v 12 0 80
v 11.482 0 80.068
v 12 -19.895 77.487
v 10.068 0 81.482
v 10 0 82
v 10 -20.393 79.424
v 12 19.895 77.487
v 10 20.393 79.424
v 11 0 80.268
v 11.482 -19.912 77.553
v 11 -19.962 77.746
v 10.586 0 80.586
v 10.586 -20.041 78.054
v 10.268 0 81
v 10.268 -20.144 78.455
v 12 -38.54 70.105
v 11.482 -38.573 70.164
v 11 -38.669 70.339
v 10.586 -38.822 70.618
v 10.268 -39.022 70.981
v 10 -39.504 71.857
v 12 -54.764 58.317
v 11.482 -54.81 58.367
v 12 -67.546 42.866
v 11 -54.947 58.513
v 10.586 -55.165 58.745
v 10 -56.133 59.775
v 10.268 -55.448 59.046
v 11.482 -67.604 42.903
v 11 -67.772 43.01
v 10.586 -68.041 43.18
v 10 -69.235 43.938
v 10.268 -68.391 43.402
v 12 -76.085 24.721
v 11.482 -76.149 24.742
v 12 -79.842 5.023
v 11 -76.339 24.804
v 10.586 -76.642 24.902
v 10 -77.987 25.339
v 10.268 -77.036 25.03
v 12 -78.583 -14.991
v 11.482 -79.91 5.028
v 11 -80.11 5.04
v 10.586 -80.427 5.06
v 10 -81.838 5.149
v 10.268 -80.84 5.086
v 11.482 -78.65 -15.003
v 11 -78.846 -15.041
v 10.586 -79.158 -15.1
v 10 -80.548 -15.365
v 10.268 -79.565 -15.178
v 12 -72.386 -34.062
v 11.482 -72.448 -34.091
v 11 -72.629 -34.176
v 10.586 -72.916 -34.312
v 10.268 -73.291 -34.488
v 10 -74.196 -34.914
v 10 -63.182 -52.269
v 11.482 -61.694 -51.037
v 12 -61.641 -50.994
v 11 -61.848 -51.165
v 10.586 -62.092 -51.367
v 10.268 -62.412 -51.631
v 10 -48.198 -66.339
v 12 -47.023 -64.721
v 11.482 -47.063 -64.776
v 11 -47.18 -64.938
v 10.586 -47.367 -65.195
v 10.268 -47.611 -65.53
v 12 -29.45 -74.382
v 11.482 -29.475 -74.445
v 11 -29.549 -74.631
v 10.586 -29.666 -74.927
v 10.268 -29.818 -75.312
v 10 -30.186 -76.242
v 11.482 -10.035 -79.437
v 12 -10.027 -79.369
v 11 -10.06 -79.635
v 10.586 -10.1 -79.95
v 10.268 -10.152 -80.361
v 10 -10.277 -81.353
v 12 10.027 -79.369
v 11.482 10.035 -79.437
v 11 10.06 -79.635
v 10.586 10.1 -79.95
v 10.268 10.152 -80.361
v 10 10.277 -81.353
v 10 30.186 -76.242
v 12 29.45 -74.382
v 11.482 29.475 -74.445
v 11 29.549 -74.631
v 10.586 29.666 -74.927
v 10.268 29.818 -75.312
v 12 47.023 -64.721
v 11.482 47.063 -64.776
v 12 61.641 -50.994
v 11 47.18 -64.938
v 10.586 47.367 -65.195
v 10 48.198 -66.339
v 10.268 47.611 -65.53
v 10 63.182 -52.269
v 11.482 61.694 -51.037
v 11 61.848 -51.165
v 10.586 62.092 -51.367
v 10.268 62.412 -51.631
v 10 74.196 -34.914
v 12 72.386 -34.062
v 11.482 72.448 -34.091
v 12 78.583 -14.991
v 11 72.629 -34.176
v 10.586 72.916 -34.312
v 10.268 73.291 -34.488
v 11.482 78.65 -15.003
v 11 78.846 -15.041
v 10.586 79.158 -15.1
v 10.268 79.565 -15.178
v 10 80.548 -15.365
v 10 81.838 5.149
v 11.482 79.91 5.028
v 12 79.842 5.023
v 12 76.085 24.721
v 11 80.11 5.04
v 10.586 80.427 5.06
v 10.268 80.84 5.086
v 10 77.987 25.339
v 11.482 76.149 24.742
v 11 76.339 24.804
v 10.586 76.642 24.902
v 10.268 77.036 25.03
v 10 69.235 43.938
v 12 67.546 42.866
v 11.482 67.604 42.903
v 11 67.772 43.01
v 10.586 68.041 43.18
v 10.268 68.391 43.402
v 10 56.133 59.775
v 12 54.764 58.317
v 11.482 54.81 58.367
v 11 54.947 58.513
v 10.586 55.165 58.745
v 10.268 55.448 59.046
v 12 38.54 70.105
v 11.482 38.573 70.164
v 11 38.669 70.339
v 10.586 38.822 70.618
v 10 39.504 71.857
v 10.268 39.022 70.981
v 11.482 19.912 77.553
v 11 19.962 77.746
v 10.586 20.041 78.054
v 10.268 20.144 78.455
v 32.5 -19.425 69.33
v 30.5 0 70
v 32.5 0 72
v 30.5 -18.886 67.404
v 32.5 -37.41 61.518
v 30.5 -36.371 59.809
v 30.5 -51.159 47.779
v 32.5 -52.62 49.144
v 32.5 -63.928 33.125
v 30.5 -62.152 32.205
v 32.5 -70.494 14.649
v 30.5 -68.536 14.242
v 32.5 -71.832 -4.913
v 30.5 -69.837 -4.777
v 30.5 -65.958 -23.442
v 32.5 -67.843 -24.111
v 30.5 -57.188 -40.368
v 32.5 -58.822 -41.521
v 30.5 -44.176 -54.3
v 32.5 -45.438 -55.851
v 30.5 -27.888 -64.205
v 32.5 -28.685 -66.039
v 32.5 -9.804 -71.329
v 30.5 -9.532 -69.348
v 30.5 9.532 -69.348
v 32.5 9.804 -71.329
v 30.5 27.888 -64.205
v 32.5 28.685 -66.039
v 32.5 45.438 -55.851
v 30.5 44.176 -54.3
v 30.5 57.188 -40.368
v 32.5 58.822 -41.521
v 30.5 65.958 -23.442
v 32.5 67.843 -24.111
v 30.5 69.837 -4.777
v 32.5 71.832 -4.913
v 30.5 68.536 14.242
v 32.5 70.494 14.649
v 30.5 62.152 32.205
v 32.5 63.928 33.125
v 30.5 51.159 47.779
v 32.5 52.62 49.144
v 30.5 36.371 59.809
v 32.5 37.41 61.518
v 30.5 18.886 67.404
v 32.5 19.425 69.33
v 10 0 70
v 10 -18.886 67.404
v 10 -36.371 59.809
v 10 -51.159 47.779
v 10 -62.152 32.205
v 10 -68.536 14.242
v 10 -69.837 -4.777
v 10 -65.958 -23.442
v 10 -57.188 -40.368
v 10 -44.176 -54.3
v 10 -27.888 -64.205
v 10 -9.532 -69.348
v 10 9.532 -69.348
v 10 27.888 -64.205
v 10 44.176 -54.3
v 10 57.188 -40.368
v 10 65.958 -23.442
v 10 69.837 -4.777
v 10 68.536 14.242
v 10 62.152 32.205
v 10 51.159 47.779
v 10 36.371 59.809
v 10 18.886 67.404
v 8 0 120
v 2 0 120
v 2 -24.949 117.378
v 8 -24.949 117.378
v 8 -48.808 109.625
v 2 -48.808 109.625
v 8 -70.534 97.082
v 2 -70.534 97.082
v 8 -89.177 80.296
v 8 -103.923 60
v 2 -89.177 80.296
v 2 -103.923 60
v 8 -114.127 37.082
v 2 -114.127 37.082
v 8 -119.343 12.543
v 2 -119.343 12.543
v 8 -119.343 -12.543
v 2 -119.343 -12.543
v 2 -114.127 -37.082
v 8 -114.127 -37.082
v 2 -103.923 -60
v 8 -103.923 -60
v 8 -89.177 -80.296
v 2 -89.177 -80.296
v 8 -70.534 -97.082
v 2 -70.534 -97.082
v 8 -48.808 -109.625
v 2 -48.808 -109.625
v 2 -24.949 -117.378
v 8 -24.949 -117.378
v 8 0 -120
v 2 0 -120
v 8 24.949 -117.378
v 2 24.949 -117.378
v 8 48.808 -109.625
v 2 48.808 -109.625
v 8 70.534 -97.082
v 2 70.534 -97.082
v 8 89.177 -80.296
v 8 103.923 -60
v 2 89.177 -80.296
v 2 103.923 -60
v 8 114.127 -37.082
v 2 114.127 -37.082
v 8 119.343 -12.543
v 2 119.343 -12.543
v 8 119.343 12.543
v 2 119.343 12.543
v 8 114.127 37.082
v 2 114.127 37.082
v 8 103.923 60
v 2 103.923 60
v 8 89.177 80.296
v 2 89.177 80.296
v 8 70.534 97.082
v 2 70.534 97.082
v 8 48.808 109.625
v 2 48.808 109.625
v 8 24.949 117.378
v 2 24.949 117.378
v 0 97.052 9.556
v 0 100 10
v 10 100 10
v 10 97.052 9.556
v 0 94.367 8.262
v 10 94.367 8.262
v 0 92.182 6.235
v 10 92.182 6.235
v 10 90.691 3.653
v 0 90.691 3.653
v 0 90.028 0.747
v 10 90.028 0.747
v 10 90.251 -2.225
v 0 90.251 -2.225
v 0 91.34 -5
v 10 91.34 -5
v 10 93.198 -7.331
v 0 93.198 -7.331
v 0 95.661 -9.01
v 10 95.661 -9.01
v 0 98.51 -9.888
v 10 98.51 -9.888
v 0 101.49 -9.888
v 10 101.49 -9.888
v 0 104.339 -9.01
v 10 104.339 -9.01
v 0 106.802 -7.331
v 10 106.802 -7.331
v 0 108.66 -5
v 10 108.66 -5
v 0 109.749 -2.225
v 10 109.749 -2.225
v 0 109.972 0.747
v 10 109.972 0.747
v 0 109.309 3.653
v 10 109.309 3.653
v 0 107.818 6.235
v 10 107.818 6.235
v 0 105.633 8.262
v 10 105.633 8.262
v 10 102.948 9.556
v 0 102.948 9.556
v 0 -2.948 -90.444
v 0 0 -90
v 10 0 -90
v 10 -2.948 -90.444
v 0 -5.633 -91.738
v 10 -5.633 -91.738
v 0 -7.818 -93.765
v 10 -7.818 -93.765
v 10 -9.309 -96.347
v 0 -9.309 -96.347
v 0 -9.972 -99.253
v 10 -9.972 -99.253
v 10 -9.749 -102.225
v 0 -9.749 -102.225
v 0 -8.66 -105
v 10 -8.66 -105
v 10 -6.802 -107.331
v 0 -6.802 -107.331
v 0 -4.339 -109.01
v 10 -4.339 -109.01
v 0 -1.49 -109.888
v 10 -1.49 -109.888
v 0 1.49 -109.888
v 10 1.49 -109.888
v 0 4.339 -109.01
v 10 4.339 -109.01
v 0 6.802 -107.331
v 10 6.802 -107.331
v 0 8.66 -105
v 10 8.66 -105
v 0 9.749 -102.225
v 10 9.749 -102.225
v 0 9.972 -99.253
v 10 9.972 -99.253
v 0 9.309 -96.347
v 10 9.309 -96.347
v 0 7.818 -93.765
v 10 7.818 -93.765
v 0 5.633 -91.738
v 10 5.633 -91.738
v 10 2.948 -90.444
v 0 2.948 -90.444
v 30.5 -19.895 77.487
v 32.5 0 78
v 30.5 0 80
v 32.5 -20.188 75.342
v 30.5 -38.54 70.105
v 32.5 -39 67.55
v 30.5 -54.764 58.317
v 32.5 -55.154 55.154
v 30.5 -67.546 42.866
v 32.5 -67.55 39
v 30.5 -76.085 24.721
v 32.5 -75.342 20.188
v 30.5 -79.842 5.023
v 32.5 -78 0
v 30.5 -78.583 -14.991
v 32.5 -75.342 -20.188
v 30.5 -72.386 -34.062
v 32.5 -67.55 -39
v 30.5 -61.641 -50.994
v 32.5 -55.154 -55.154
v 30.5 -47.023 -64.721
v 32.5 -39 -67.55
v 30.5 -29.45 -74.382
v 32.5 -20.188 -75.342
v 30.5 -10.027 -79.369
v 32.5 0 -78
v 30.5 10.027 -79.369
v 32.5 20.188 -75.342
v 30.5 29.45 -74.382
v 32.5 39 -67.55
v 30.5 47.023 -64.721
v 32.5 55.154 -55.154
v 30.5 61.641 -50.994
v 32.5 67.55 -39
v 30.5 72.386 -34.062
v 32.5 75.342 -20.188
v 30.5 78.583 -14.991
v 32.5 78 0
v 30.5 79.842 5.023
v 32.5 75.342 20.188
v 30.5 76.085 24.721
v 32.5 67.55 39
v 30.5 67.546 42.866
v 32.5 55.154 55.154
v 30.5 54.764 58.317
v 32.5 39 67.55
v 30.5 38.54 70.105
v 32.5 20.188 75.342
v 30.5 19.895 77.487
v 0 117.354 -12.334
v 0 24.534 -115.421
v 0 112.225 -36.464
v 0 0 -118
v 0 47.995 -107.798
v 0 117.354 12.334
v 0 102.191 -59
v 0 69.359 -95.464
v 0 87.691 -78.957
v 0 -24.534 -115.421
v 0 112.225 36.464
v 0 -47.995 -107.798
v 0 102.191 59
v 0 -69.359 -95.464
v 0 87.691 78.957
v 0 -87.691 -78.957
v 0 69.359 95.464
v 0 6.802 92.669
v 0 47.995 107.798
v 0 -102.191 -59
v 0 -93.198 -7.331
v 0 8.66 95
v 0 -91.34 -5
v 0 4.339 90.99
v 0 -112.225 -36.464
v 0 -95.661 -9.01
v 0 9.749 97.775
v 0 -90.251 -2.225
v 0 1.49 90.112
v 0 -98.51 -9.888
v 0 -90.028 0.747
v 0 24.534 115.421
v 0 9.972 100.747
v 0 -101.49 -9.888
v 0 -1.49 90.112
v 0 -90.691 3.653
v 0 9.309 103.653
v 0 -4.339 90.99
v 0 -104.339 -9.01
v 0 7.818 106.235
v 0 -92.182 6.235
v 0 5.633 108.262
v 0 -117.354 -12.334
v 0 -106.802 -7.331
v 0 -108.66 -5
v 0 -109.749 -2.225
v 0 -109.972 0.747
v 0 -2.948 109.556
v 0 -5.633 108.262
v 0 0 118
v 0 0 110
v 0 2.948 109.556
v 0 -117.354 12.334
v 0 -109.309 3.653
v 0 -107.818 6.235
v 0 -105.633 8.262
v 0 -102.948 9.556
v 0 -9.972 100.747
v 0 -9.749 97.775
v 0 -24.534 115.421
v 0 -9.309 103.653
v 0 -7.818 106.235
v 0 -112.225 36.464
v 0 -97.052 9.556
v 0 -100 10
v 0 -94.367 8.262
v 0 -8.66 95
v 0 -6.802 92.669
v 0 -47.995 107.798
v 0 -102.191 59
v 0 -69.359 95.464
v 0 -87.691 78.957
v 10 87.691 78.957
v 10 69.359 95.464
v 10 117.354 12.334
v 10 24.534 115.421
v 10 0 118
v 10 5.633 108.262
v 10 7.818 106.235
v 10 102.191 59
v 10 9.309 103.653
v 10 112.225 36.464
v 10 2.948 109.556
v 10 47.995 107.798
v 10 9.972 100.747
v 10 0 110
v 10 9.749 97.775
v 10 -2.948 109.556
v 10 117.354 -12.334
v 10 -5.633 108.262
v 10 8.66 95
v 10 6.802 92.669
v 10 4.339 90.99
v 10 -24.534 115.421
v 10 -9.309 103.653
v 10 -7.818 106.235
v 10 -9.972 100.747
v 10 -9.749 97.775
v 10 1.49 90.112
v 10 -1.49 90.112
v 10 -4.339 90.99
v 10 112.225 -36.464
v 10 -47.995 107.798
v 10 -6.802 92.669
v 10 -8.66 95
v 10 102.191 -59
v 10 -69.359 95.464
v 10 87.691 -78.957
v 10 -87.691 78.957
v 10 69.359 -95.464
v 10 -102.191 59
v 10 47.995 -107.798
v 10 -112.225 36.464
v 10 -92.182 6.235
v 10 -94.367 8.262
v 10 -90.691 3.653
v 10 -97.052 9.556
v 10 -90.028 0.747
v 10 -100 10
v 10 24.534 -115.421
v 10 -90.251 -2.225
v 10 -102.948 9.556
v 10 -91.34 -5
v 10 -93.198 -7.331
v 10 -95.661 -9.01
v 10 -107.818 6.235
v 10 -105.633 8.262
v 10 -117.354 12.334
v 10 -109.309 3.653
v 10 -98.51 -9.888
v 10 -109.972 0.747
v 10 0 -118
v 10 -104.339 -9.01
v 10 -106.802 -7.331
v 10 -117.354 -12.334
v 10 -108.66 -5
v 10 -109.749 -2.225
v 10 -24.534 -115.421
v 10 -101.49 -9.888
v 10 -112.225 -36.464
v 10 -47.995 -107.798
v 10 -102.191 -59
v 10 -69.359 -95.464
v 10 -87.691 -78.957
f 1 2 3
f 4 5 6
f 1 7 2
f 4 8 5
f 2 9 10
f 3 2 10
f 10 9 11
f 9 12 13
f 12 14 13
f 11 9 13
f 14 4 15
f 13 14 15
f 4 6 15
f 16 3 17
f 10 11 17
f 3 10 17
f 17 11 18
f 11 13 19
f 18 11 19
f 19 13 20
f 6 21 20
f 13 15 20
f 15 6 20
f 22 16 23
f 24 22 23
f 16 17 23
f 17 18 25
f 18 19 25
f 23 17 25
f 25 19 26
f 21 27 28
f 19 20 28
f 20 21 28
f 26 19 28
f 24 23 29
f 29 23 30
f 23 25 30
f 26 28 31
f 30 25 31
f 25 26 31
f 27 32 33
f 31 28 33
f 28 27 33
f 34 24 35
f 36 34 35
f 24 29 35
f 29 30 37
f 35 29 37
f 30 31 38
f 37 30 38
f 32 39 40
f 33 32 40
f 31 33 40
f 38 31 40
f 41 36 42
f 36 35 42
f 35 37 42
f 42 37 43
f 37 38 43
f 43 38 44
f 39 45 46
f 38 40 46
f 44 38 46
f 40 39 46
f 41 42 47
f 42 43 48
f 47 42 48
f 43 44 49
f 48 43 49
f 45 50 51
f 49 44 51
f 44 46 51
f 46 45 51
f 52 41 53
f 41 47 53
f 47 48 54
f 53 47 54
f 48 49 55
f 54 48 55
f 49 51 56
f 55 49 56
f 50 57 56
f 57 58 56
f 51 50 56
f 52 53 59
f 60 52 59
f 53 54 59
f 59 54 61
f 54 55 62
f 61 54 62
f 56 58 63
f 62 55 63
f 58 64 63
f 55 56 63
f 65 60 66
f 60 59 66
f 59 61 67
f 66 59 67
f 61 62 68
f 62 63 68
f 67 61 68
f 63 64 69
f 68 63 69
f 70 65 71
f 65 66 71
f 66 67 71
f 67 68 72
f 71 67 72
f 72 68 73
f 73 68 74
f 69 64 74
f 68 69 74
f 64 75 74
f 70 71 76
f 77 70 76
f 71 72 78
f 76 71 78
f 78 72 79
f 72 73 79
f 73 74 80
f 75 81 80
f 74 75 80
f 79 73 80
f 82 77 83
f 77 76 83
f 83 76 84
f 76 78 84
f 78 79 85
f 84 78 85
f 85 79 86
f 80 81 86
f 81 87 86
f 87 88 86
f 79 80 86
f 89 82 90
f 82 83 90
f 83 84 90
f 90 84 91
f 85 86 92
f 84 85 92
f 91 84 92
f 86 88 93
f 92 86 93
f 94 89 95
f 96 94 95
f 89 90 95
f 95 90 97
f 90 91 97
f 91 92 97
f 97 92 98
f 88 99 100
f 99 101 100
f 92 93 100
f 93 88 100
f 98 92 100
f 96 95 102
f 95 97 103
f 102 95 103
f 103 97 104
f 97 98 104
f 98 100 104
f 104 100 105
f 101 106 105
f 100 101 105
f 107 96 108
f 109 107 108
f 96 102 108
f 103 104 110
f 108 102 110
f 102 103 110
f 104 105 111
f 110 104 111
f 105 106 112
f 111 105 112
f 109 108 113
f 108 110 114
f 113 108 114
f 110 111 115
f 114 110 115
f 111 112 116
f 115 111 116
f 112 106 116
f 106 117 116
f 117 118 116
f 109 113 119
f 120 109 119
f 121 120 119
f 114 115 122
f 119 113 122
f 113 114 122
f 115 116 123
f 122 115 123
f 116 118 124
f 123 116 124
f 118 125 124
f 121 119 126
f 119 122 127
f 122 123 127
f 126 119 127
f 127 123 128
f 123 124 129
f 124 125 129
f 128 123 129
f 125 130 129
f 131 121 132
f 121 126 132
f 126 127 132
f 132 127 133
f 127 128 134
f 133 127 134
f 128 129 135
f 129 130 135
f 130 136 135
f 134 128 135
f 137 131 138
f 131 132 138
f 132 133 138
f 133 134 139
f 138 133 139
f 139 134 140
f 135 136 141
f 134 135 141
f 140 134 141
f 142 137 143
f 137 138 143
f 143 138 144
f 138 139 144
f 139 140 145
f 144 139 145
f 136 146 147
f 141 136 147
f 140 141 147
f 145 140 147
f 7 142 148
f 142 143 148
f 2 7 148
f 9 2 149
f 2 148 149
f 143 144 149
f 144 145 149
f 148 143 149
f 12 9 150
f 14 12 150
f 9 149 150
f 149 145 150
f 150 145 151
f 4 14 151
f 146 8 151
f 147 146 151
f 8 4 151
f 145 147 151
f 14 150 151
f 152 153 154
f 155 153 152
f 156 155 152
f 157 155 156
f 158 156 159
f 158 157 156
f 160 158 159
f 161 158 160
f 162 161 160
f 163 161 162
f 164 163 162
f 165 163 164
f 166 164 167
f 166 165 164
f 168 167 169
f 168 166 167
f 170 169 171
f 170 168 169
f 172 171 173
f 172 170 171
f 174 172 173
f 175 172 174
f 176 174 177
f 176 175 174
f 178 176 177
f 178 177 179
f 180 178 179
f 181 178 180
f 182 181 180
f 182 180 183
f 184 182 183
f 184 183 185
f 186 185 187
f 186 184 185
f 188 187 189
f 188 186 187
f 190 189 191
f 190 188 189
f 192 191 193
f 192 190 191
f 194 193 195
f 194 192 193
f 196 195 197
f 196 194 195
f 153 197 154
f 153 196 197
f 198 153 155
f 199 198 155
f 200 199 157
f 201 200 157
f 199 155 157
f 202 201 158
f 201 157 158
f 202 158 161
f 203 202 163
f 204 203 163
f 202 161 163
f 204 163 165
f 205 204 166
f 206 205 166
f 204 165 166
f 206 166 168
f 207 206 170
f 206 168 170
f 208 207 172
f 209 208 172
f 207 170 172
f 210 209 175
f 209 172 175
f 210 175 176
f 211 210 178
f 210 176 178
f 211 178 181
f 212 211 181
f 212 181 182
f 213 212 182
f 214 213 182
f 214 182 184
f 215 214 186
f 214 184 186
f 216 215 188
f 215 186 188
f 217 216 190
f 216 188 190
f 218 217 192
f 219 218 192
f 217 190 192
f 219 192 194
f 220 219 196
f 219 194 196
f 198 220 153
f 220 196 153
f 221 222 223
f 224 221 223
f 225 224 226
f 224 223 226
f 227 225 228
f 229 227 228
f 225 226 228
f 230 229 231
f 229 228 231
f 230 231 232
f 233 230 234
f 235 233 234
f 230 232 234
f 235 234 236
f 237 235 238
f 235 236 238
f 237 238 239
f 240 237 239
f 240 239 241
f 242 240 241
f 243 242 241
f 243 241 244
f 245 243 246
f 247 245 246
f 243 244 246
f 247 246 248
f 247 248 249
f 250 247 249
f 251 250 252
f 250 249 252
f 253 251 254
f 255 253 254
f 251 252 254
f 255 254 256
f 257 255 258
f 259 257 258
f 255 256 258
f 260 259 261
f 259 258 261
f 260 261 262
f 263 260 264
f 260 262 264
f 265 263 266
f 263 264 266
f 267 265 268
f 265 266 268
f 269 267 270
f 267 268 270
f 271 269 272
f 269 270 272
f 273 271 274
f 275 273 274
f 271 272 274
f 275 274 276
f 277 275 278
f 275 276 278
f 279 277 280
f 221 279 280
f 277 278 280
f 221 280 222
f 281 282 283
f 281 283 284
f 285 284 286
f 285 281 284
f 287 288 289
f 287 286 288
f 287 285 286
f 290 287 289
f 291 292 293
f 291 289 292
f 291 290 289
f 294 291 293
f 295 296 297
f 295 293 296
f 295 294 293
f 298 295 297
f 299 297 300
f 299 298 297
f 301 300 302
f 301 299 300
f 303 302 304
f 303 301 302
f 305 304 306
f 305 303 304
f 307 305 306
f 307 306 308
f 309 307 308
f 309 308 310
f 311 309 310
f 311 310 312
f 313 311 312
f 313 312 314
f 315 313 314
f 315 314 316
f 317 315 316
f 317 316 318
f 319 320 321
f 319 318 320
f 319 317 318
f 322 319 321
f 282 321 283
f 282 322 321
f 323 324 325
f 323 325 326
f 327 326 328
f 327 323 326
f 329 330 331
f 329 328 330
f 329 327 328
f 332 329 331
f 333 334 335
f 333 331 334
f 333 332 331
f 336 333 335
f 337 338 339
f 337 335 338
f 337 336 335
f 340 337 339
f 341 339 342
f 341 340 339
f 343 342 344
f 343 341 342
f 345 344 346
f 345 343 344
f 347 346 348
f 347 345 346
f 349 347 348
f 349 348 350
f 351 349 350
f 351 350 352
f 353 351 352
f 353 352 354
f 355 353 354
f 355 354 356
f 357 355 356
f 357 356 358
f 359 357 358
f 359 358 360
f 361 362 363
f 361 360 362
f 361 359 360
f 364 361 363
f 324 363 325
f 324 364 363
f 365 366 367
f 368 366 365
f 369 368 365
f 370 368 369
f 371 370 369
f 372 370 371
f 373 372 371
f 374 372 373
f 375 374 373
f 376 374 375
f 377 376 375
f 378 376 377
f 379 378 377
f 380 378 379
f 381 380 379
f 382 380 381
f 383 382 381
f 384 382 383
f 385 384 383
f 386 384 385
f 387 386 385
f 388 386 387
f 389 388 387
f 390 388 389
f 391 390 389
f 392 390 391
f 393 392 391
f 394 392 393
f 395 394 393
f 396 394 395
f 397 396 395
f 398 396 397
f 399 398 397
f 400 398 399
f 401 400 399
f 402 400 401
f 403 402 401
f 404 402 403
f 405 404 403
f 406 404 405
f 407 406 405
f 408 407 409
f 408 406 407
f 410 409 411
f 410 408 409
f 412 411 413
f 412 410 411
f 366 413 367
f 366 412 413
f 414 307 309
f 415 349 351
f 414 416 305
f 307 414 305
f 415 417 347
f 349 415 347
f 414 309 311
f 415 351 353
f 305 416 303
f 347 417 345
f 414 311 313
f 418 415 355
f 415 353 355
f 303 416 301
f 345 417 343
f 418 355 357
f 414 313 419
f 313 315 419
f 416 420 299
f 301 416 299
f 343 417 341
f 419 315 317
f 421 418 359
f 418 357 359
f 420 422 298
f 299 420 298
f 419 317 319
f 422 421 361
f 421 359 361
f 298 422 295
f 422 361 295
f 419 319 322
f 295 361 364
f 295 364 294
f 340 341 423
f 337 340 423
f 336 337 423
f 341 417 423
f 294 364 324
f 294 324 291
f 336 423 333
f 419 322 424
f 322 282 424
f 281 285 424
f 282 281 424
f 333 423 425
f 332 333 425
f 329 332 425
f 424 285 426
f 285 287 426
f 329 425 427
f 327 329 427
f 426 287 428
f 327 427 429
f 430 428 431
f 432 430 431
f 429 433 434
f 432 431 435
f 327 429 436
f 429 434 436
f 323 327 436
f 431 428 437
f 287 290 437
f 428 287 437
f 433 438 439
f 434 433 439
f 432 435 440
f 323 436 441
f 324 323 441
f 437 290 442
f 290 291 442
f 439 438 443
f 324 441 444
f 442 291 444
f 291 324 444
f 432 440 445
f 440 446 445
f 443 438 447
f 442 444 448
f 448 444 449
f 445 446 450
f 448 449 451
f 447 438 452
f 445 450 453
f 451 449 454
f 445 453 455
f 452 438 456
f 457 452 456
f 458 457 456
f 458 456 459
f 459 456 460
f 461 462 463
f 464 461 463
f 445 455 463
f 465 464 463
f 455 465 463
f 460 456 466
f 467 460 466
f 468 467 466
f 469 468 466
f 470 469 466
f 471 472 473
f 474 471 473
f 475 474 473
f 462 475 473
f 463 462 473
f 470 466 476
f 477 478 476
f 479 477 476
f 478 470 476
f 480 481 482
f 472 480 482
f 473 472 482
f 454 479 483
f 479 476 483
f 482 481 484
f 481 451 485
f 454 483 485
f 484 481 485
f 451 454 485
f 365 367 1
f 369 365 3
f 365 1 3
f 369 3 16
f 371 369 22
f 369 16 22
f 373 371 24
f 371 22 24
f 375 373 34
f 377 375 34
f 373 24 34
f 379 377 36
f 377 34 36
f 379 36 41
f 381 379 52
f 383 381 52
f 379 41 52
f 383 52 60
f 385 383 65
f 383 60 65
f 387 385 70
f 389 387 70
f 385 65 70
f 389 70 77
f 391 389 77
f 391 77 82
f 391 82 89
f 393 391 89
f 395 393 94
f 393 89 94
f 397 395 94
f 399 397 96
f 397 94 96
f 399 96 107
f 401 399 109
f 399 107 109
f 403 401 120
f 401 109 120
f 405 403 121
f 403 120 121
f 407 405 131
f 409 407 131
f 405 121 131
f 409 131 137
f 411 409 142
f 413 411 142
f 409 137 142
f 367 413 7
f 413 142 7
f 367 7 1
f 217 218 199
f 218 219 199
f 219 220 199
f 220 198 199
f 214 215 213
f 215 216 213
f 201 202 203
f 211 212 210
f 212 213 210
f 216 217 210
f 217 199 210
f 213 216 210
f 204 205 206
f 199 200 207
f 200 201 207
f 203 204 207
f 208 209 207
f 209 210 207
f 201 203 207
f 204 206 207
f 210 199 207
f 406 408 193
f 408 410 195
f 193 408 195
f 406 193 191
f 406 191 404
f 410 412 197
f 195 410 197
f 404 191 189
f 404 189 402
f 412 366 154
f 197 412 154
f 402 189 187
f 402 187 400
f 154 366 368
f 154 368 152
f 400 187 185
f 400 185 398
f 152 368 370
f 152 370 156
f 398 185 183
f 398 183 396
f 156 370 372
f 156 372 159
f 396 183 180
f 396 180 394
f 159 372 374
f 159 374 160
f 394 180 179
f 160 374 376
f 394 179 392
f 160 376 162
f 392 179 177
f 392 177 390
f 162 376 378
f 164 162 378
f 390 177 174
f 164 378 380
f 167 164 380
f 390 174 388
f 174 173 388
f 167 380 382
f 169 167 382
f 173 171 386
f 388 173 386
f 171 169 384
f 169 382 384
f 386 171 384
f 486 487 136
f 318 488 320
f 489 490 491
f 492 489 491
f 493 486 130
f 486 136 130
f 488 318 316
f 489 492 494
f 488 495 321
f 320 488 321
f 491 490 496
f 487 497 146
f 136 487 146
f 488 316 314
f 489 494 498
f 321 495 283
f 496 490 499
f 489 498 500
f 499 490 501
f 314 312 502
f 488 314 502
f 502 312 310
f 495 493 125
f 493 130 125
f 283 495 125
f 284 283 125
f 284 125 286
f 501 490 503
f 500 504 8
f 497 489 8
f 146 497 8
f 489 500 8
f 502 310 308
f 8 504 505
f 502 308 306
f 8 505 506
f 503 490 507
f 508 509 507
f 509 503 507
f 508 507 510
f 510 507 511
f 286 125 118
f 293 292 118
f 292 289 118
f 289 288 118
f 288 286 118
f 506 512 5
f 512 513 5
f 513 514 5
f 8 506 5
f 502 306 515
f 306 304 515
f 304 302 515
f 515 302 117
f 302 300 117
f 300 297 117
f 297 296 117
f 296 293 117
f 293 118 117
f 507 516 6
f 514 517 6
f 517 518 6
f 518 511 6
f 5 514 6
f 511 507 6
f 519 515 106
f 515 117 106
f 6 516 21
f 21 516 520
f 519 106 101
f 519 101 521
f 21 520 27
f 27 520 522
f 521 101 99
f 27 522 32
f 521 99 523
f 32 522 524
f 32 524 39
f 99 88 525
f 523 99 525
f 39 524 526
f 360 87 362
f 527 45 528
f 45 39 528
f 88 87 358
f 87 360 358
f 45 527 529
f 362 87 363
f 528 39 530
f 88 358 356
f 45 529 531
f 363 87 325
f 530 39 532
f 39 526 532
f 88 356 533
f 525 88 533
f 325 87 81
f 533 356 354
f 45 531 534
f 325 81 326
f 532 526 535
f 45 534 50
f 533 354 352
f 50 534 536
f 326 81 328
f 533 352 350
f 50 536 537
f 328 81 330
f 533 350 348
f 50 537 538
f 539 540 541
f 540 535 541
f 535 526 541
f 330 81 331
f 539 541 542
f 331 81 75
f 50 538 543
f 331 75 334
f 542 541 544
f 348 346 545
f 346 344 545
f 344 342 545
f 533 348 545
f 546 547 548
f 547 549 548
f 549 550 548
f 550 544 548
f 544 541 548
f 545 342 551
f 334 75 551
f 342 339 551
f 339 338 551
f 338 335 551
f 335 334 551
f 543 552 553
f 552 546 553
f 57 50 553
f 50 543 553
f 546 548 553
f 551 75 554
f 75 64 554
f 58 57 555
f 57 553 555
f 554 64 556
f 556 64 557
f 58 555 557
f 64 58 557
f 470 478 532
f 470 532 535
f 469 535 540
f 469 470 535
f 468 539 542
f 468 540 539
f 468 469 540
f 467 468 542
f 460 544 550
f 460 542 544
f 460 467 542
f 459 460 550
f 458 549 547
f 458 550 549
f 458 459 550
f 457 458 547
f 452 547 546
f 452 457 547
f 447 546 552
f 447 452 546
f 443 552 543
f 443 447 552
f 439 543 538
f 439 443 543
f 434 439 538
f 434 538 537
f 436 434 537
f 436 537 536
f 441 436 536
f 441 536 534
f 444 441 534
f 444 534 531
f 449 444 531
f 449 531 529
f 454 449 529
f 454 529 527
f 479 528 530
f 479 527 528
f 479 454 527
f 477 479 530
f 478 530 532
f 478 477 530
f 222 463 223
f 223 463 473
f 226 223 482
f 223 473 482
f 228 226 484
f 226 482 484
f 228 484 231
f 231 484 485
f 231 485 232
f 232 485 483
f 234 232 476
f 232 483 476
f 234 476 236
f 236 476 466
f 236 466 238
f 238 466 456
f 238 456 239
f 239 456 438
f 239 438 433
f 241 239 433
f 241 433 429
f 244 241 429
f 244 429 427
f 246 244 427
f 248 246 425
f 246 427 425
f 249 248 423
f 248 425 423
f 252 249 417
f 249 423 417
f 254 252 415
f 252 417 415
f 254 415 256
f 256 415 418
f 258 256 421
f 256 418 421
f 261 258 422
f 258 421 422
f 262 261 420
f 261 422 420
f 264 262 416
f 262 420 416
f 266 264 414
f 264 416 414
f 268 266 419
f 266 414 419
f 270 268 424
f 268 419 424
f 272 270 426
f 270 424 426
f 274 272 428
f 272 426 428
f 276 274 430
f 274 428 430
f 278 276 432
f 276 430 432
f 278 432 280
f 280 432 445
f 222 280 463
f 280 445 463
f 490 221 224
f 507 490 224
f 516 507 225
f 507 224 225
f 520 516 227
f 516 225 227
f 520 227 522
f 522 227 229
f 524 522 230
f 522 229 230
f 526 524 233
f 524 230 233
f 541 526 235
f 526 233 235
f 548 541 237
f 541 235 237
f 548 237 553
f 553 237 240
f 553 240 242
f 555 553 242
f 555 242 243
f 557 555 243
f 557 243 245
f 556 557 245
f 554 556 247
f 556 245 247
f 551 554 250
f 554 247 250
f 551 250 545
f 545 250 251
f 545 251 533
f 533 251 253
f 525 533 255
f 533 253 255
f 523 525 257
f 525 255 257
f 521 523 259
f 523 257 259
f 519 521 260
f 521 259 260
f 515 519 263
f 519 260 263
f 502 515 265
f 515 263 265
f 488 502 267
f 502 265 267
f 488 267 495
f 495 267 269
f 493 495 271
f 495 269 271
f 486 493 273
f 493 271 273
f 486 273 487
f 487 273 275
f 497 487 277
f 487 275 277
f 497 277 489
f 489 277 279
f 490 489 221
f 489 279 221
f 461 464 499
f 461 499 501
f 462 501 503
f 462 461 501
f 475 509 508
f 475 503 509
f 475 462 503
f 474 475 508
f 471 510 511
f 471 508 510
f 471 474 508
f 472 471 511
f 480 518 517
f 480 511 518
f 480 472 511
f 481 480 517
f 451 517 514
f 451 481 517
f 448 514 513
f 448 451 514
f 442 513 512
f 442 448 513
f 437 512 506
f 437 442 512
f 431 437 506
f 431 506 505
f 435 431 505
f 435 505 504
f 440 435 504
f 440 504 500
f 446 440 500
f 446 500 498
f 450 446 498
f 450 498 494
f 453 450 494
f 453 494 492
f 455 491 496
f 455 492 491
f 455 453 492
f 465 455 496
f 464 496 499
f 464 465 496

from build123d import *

# Parameters (mm, degrees)
CUT_EXTRUDE_3_DEPTH      = 173.789611956
CUT_EXTRUDE_3_DEPTH_BACK = 173.789611956
SKETCH_2_R               = 10
FILLET_1_R               = 2
CHAMFER_1_SIZE           = 2


with BuildPart() as part:
    # 草图1 → 旋转1 (revolve)
    with BuildSketch(Plane.XY, mode=Mode.PRIVATE) as revolve_1_sk:
        Polygon((0, 0), (10, 0), (10, 70), (32.5, 70), (32.5, 80), (10, 80), (10, 120), (0, 120), align=None)
    revolve(revolve_1_sk.sketch.rotate(Axis((-39.78021978, 0, 0), (1, 0, 0)), 90), axis=Axis((-39.78021978, 0, 0), (1, 0, 0)))

    # 草图2 → 切除-拉伸3 (cut, two sides: drawn at the far end of the back side and taken through both)
    with BuildSketch(Plane(origin=(0, 0, 0), x_dir=(0, 0, -1), z_dir=(1, 0, 0)).offset(-CUT_EXTRUDE_3_DEPTH_BACK)):
        with Locations(Location((100, 0, 0), (0, 0, 180))):
            Circle(SKETCH_2_R)
        with Locations(Location((0, -100, 0), (0, 0, 180))):
            Circle(SKETCH_2_R)
        with Locations(Location((-100, 0, 0), (0, 0, 180))):
            Circle(SKETCH_2_R)
        with Locations(Location((0, 100, 0), (0, 0, 180))):
            Circle(SKETCH_2_R)
    extrude(amount=CUT_EXTRUDE_3_DEPTH + CUT_EXTRUDE_3_DEPTH_BACK, mode=Mode.SUBTRACT)

    # 圆角1
    fillet_1_edges = [part.edges().sort_by_distance(p)[0] for p in [
        (10, 0, -80),
    ]]
    fillet(fillet_1_edges, radius=FILLET_1_R)

    # 倒角1
    chamfer_1_edges = [part.edges().sort_by_distance(p)[0] for p in [
        (0, 0, -120),
        (10, 0, -120),
        (32.5, 0, -80),
        (32.5, 0, -70),
    ]]
    chamfer(chamfer_1_edges, length=CHAMFER_1_SIZE)


solid = part.part
